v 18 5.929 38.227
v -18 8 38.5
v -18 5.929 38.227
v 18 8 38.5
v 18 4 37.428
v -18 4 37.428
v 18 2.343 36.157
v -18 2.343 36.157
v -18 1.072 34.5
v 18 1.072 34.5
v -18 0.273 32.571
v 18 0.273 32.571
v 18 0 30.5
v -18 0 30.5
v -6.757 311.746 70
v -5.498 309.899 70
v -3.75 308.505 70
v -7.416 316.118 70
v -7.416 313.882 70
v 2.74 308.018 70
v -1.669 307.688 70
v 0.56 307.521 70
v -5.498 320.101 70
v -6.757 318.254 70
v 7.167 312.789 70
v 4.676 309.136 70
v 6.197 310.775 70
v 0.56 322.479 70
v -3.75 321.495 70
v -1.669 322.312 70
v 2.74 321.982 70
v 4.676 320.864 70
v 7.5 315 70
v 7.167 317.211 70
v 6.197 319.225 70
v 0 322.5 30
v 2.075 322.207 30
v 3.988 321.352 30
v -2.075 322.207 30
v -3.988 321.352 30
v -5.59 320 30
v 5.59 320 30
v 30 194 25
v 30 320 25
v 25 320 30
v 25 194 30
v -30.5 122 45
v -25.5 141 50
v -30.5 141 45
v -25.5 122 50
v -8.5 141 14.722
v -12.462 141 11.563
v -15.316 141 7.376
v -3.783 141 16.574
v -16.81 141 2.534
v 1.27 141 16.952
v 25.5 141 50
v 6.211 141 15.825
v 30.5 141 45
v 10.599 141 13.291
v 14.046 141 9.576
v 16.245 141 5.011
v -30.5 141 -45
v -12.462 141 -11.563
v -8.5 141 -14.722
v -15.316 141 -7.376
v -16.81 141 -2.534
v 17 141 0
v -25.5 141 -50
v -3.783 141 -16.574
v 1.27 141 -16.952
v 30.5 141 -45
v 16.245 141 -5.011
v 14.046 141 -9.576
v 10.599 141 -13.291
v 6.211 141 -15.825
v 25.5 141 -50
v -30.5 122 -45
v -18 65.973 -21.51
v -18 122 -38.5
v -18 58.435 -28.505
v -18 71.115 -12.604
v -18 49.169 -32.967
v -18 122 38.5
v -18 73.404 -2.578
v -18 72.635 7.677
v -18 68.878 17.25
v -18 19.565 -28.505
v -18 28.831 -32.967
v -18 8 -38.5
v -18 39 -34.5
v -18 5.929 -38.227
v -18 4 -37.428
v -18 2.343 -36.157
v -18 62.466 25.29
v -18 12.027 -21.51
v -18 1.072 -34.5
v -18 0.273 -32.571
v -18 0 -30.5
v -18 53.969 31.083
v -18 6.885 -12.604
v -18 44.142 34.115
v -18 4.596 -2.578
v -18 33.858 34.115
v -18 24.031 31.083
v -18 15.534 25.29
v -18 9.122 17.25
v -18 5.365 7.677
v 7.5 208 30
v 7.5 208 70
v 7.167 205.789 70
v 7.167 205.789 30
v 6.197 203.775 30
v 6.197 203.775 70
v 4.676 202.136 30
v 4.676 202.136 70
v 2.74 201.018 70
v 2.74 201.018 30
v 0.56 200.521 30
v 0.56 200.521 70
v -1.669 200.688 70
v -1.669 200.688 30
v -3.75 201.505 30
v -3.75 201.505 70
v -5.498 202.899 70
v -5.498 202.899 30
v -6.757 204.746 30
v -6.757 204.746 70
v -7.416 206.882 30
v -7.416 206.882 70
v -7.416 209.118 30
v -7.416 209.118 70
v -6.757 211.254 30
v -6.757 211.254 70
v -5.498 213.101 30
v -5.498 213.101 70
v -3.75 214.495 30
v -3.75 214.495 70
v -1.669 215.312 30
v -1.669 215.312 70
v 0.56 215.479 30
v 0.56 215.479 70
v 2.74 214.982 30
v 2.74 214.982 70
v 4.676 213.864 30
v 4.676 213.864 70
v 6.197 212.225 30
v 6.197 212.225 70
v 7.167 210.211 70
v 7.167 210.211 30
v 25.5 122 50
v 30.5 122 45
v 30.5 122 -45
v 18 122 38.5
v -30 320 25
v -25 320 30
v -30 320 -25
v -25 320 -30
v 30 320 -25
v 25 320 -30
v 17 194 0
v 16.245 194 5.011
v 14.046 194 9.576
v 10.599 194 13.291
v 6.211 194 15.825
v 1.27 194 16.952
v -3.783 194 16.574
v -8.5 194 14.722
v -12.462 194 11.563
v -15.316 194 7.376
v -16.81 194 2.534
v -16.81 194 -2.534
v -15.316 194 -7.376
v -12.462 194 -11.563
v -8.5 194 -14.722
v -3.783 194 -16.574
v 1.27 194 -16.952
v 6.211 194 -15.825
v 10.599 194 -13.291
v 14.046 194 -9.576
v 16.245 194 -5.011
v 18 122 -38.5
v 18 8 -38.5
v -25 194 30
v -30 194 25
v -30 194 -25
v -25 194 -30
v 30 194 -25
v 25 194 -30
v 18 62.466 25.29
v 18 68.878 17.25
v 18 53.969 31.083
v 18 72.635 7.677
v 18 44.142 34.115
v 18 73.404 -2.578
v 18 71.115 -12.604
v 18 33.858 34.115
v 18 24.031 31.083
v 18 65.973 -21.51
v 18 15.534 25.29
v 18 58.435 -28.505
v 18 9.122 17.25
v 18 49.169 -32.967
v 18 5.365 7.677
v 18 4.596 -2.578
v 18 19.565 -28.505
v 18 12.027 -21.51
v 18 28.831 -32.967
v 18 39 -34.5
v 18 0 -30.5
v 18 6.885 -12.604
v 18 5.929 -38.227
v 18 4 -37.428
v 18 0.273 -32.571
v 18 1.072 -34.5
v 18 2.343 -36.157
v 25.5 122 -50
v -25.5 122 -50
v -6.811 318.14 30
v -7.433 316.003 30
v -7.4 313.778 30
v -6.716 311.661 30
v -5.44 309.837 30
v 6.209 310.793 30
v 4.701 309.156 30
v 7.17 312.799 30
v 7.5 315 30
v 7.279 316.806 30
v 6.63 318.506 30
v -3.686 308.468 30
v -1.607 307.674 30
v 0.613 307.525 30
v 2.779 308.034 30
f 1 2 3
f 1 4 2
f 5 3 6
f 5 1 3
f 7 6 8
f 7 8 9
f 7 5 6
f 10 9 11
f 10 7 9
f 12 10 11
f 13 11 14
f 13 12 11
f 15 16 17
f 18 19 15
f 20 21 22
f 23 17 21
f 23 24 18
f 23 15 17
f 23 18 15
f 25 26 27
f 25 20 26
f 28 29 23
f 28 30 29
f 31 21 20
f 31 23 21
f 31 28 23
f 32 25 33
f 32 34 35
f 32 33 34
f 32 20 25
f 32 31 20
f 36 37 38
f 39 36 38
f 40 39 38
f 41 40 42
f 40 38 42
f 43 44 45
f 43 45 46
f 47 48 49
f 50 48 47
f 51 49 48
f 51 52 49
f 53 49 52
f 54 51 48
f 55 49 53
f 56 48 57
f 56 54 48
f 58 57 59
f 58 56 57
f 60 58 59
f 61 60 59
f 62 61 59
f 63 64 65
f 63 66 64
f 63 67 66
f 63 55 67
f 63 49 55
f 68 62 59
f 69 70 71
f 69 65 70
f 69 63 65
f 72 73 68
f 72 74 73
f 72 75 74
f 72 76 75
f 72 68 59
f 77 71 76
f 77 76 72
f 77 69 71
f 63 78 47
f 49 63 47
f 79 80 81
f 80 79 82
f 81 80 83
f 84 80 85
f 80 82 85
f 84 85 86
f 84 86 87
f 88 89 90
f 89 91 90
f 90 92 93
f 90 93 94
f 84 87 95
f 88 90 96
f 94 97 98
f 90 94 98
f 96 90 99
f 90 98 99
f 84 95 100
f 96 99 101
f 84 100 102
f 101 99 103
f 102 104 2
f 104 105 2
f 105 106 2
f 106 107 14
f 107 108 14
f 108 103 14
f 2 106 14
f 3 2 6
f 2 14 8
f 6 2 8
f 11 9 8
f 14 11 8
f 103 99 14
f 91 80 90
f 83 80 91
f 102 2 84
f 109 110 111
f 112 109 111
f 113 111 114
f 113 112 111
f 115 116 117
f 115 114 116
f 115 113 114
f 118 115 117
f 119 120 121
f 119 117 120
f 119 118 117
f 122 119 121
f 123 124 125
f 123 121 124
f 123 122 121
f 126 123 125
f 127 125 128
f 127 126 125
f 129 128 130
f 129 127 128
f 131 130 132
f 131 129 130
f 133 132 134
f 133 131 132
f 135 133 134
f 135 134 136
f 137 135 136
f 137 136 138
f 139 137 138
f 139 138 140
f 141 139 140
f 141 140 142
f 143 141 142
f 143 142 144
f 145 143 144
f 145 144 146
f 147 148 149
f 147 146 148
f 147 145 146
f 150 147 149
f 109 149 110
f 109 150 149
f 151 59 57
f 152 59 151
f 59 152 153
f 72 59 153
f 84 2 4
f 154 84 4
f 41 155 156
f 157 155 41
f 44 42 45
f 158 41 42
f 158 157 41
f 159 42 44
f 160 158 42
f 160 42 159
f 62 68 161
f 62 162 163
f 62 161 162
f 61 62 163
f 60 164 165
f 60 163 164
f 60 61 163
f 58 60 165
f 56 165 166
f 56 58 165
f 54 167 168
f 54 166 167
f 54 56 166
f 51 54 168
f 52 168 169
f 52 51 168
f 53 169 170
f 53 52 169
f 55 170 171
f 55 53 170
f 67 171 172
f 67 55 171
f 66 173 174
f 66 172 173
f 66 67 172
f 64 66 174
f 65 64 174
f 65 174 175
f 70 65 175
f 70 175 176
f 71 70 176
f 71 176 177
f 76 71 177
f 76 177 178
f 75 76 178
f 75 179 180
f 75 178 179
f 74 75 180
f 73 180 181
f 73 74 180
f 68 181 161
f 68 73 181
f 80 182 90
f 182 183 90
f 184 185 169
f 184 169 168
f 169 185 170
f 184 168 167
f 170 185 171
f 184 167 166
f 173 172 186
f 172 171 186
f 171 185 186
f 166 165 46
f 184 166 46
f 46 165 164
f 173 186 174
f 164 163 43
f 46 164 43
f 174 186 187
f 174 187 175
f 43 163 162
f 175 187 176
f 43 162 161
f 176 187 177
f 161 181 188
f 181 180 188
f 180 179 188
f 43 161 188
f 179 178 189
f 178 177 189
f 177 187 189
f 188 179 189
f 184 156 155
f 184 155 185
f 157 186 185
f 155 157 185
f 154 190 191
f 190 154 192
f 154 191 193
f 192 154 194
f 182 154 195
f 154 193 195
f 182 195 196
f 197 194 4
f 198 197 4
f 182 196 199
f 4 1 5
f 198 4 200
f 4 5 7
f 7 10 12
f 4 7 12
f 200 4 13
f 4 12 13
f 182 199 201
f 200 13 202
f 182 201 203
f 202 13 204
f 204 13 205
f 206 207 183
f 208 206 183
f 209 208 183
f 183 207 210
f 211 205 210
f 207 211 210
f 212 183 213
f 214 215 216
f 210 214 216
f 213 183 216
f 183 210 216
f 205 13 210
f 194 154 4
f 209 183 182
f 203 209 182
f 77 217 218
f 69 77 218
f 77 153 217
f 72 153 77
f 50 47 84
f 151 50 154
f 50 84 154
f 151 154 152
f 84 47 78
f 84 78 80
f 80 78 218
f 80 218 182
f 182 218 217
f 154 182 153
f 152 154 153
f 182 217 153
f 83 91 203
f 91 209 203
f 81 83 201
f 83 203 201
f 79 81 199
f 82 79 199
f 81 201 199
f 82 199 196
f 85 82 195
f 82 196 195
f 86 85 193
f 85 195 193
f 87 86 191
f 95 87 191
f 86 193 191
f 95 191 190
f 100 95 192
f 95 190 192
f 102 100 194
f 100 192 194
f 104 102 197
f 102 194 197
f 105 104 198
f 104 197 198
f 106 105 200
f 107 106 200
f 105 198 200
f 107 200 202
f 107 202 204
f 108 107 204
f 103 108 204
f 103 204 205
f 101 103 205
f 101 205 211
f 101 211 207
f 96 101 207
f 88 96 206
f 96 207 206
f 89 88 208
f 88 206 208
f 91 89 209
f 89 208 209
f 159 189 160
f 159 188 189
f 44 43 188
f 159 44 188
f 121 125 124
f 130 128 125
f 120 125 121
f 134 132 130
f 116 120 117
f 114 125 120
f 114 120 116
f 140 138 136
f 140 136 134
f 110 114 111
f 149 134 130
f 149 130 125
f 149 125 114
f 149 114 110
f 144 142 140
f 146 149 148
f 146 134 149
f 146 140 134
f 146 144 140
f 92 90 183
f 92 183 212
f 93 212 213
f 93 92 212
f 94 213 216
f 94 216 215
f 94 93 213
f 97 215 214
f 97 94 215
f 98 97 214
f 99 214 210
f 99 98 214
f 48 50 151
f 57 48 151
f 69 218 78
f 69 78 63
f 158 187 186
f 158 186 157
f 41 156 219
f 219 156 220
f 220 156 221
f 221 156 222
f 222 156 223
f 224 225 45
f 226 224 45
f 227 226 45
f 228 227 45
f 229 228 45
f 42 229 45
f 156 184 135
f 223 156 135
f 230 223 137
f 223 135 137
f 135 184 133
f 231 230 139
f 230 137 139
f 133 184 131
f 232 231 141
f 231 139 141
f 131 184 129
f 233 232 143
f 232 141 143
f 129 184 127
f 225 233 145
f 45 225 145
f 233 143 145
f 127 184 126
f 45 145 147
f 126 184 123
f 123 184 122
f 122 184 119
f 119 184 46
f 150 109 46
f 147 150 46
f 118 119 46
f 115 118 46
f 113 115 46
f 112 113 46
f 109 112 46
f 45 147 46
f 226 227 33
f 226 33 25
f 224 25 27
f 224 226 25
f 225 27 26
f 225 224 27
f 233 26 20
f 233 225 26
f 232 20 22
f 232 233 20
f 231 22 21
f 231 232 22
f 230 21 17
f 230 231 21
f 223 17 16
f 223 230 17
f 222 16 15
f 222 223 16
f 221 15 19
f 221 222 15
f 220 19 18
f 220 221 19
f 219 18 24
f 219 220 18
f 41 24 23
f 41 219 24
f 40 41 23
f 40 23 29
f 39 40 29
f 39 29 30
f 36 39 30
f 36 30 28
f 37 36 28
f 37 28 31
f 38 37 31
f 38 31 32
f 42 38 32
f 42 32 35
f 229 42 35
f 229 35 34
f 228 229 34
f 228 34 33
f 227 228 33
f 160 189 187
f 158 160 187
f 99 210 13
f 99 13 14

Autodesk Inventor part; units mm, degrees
ref_plane "YZ Plane" through (0, 0, 0) normal (1, 0, 0) x (0, 1, 0)
ref_plane "XZ Plane" through (0, 0, 0) normal (0, 1, 0) x (-1, 0, 0)
ref_plane "XY Plane" through (0, 0, 0) normal (0, 0, 1) x (1, 0, 0)
sketch "Sketch1" plane through (0, 0, 0) normal (0, 1, 0) x (-1, 0, 0)
  line L0 (18, 38.5) -> (-18, 38.5)
  line L1 (-18, 38.5) -> (-18, -38.5)
  line L2 (-18, -38.5) -> (18, -38.5)
  line L3 (18, -38.5) -> (18, 38.5)
  line L4 (18, 38.5) -> (-18, -38.5) construction
  point P0 (0, 0)
  point P1 (0, 0)
  dimension "d0" = 77
  dimension "d1" = 36
extrude "Extrusion1" add sketch "Sketch1" along normal blind 122
sketch "Sketch2" plane through (0, 122, 0) normal (0, 1, 0) x (1, 0, 0)
  line L0 (-30.5, -50) -> (30.5, -50)
  line L1 (30.5, -50) -> (30.5, 50)
  line L2 (30.5, 50) -> (-30.5, 50)
  line L3 (-30.5, 50) -> (-30.5, -50)
  line L4 (-30.5, 50) -> (30.5, -50) construction
  point P0 (0, 0)
  point P1 (0, 0)
  dimension "d4" = 100
  dimension "d5" = 61
extrude "Extrusion2" add sketch "Sketch2" along normal blind 19
sketch "Sketch3" plane through (0, 141, 0) normal (0, 1, 0) x (1, 0, 0)
  circle A0 centre (0, 0) radius 17
  dimension "d8" = 34
extrude "Extrusion3" add sketch "Sketch3" along normal blind 53
sketch "Sketch4" plane through (0, 194, 0) normal (0, 1, 0) x (1, 0, 0)
  line L0 (-30, -30) -> (30, -30)
  line L1 (30, -30) -> (30, 30)
  line L2 (30, 30) -> (-30, 30)
  line L3 (-30, 30) -> (-30, -30)
  line L4 (-30, 30) -> (30, -30) construction
  point P0 (0, 0)
  point P1 (0, 0)
  dimension "d11" = 60
extrude "Extrusion4" add sketch "Sketch4" along normal blind 126
sketch "Sketch5" plane through (-30, 194, 30) normal (0, 0, 1) x (1, 0, 0)
  circle A0 centre (30, 14) radius 7.5
  line L0 (0, 0) -> (60, 0) projected
  circle A1 centre (30, 121) radius 7.5
  line L1 (0, 126) -> (60, 126) projected
  point P0 (30, -194)
  point P1 (30, 0)
  point P2 (30, 126)
  point P3 (35.5902, 126)
  point P4 (24.4098, 126)
  dimension "d14" = 15
  dimension "d15" = 14
  dimension "d16" = 5
extrude "Extrusion5" add sketch "Sketch5" along normal blind 40
chamfer "Chamfer1" distance 5 angle 45 4 edges at (30, 257, 30) (30, 257, -30) (-30, 257, -30) (-30, 257, 30)
chamfer "Chamfer2" distance 5 angle 45 4 edges at (30.5, 131.5, -50) (-30.5, 131.5, -50) (-30.5, 131.5, 50) (30.5, 131.5, 50)
fillet "Fillet1" radius 8 2 edges at (0, 0, 38.5) (0, 0, -38.5)
sketch "Sketch6" plane through (18, 122, 38.5) normal (1, 0, 0) x (0, 0, -1)
  circle A0 centre (38.5, -83) radius 34.5
  line L0 (8, -122) -> (69, -122) projected
  point P0 (38.5, -122)
  point P1 (38.5, -122)
  dimension "d26" = 39
  dimension "d27" = 69
extrude "Extrusion6" cut sketch "Sketch6" against normal through all
properties part number "Gatevalve_70_pneumatic" material "Stainless Steel, 440C"
